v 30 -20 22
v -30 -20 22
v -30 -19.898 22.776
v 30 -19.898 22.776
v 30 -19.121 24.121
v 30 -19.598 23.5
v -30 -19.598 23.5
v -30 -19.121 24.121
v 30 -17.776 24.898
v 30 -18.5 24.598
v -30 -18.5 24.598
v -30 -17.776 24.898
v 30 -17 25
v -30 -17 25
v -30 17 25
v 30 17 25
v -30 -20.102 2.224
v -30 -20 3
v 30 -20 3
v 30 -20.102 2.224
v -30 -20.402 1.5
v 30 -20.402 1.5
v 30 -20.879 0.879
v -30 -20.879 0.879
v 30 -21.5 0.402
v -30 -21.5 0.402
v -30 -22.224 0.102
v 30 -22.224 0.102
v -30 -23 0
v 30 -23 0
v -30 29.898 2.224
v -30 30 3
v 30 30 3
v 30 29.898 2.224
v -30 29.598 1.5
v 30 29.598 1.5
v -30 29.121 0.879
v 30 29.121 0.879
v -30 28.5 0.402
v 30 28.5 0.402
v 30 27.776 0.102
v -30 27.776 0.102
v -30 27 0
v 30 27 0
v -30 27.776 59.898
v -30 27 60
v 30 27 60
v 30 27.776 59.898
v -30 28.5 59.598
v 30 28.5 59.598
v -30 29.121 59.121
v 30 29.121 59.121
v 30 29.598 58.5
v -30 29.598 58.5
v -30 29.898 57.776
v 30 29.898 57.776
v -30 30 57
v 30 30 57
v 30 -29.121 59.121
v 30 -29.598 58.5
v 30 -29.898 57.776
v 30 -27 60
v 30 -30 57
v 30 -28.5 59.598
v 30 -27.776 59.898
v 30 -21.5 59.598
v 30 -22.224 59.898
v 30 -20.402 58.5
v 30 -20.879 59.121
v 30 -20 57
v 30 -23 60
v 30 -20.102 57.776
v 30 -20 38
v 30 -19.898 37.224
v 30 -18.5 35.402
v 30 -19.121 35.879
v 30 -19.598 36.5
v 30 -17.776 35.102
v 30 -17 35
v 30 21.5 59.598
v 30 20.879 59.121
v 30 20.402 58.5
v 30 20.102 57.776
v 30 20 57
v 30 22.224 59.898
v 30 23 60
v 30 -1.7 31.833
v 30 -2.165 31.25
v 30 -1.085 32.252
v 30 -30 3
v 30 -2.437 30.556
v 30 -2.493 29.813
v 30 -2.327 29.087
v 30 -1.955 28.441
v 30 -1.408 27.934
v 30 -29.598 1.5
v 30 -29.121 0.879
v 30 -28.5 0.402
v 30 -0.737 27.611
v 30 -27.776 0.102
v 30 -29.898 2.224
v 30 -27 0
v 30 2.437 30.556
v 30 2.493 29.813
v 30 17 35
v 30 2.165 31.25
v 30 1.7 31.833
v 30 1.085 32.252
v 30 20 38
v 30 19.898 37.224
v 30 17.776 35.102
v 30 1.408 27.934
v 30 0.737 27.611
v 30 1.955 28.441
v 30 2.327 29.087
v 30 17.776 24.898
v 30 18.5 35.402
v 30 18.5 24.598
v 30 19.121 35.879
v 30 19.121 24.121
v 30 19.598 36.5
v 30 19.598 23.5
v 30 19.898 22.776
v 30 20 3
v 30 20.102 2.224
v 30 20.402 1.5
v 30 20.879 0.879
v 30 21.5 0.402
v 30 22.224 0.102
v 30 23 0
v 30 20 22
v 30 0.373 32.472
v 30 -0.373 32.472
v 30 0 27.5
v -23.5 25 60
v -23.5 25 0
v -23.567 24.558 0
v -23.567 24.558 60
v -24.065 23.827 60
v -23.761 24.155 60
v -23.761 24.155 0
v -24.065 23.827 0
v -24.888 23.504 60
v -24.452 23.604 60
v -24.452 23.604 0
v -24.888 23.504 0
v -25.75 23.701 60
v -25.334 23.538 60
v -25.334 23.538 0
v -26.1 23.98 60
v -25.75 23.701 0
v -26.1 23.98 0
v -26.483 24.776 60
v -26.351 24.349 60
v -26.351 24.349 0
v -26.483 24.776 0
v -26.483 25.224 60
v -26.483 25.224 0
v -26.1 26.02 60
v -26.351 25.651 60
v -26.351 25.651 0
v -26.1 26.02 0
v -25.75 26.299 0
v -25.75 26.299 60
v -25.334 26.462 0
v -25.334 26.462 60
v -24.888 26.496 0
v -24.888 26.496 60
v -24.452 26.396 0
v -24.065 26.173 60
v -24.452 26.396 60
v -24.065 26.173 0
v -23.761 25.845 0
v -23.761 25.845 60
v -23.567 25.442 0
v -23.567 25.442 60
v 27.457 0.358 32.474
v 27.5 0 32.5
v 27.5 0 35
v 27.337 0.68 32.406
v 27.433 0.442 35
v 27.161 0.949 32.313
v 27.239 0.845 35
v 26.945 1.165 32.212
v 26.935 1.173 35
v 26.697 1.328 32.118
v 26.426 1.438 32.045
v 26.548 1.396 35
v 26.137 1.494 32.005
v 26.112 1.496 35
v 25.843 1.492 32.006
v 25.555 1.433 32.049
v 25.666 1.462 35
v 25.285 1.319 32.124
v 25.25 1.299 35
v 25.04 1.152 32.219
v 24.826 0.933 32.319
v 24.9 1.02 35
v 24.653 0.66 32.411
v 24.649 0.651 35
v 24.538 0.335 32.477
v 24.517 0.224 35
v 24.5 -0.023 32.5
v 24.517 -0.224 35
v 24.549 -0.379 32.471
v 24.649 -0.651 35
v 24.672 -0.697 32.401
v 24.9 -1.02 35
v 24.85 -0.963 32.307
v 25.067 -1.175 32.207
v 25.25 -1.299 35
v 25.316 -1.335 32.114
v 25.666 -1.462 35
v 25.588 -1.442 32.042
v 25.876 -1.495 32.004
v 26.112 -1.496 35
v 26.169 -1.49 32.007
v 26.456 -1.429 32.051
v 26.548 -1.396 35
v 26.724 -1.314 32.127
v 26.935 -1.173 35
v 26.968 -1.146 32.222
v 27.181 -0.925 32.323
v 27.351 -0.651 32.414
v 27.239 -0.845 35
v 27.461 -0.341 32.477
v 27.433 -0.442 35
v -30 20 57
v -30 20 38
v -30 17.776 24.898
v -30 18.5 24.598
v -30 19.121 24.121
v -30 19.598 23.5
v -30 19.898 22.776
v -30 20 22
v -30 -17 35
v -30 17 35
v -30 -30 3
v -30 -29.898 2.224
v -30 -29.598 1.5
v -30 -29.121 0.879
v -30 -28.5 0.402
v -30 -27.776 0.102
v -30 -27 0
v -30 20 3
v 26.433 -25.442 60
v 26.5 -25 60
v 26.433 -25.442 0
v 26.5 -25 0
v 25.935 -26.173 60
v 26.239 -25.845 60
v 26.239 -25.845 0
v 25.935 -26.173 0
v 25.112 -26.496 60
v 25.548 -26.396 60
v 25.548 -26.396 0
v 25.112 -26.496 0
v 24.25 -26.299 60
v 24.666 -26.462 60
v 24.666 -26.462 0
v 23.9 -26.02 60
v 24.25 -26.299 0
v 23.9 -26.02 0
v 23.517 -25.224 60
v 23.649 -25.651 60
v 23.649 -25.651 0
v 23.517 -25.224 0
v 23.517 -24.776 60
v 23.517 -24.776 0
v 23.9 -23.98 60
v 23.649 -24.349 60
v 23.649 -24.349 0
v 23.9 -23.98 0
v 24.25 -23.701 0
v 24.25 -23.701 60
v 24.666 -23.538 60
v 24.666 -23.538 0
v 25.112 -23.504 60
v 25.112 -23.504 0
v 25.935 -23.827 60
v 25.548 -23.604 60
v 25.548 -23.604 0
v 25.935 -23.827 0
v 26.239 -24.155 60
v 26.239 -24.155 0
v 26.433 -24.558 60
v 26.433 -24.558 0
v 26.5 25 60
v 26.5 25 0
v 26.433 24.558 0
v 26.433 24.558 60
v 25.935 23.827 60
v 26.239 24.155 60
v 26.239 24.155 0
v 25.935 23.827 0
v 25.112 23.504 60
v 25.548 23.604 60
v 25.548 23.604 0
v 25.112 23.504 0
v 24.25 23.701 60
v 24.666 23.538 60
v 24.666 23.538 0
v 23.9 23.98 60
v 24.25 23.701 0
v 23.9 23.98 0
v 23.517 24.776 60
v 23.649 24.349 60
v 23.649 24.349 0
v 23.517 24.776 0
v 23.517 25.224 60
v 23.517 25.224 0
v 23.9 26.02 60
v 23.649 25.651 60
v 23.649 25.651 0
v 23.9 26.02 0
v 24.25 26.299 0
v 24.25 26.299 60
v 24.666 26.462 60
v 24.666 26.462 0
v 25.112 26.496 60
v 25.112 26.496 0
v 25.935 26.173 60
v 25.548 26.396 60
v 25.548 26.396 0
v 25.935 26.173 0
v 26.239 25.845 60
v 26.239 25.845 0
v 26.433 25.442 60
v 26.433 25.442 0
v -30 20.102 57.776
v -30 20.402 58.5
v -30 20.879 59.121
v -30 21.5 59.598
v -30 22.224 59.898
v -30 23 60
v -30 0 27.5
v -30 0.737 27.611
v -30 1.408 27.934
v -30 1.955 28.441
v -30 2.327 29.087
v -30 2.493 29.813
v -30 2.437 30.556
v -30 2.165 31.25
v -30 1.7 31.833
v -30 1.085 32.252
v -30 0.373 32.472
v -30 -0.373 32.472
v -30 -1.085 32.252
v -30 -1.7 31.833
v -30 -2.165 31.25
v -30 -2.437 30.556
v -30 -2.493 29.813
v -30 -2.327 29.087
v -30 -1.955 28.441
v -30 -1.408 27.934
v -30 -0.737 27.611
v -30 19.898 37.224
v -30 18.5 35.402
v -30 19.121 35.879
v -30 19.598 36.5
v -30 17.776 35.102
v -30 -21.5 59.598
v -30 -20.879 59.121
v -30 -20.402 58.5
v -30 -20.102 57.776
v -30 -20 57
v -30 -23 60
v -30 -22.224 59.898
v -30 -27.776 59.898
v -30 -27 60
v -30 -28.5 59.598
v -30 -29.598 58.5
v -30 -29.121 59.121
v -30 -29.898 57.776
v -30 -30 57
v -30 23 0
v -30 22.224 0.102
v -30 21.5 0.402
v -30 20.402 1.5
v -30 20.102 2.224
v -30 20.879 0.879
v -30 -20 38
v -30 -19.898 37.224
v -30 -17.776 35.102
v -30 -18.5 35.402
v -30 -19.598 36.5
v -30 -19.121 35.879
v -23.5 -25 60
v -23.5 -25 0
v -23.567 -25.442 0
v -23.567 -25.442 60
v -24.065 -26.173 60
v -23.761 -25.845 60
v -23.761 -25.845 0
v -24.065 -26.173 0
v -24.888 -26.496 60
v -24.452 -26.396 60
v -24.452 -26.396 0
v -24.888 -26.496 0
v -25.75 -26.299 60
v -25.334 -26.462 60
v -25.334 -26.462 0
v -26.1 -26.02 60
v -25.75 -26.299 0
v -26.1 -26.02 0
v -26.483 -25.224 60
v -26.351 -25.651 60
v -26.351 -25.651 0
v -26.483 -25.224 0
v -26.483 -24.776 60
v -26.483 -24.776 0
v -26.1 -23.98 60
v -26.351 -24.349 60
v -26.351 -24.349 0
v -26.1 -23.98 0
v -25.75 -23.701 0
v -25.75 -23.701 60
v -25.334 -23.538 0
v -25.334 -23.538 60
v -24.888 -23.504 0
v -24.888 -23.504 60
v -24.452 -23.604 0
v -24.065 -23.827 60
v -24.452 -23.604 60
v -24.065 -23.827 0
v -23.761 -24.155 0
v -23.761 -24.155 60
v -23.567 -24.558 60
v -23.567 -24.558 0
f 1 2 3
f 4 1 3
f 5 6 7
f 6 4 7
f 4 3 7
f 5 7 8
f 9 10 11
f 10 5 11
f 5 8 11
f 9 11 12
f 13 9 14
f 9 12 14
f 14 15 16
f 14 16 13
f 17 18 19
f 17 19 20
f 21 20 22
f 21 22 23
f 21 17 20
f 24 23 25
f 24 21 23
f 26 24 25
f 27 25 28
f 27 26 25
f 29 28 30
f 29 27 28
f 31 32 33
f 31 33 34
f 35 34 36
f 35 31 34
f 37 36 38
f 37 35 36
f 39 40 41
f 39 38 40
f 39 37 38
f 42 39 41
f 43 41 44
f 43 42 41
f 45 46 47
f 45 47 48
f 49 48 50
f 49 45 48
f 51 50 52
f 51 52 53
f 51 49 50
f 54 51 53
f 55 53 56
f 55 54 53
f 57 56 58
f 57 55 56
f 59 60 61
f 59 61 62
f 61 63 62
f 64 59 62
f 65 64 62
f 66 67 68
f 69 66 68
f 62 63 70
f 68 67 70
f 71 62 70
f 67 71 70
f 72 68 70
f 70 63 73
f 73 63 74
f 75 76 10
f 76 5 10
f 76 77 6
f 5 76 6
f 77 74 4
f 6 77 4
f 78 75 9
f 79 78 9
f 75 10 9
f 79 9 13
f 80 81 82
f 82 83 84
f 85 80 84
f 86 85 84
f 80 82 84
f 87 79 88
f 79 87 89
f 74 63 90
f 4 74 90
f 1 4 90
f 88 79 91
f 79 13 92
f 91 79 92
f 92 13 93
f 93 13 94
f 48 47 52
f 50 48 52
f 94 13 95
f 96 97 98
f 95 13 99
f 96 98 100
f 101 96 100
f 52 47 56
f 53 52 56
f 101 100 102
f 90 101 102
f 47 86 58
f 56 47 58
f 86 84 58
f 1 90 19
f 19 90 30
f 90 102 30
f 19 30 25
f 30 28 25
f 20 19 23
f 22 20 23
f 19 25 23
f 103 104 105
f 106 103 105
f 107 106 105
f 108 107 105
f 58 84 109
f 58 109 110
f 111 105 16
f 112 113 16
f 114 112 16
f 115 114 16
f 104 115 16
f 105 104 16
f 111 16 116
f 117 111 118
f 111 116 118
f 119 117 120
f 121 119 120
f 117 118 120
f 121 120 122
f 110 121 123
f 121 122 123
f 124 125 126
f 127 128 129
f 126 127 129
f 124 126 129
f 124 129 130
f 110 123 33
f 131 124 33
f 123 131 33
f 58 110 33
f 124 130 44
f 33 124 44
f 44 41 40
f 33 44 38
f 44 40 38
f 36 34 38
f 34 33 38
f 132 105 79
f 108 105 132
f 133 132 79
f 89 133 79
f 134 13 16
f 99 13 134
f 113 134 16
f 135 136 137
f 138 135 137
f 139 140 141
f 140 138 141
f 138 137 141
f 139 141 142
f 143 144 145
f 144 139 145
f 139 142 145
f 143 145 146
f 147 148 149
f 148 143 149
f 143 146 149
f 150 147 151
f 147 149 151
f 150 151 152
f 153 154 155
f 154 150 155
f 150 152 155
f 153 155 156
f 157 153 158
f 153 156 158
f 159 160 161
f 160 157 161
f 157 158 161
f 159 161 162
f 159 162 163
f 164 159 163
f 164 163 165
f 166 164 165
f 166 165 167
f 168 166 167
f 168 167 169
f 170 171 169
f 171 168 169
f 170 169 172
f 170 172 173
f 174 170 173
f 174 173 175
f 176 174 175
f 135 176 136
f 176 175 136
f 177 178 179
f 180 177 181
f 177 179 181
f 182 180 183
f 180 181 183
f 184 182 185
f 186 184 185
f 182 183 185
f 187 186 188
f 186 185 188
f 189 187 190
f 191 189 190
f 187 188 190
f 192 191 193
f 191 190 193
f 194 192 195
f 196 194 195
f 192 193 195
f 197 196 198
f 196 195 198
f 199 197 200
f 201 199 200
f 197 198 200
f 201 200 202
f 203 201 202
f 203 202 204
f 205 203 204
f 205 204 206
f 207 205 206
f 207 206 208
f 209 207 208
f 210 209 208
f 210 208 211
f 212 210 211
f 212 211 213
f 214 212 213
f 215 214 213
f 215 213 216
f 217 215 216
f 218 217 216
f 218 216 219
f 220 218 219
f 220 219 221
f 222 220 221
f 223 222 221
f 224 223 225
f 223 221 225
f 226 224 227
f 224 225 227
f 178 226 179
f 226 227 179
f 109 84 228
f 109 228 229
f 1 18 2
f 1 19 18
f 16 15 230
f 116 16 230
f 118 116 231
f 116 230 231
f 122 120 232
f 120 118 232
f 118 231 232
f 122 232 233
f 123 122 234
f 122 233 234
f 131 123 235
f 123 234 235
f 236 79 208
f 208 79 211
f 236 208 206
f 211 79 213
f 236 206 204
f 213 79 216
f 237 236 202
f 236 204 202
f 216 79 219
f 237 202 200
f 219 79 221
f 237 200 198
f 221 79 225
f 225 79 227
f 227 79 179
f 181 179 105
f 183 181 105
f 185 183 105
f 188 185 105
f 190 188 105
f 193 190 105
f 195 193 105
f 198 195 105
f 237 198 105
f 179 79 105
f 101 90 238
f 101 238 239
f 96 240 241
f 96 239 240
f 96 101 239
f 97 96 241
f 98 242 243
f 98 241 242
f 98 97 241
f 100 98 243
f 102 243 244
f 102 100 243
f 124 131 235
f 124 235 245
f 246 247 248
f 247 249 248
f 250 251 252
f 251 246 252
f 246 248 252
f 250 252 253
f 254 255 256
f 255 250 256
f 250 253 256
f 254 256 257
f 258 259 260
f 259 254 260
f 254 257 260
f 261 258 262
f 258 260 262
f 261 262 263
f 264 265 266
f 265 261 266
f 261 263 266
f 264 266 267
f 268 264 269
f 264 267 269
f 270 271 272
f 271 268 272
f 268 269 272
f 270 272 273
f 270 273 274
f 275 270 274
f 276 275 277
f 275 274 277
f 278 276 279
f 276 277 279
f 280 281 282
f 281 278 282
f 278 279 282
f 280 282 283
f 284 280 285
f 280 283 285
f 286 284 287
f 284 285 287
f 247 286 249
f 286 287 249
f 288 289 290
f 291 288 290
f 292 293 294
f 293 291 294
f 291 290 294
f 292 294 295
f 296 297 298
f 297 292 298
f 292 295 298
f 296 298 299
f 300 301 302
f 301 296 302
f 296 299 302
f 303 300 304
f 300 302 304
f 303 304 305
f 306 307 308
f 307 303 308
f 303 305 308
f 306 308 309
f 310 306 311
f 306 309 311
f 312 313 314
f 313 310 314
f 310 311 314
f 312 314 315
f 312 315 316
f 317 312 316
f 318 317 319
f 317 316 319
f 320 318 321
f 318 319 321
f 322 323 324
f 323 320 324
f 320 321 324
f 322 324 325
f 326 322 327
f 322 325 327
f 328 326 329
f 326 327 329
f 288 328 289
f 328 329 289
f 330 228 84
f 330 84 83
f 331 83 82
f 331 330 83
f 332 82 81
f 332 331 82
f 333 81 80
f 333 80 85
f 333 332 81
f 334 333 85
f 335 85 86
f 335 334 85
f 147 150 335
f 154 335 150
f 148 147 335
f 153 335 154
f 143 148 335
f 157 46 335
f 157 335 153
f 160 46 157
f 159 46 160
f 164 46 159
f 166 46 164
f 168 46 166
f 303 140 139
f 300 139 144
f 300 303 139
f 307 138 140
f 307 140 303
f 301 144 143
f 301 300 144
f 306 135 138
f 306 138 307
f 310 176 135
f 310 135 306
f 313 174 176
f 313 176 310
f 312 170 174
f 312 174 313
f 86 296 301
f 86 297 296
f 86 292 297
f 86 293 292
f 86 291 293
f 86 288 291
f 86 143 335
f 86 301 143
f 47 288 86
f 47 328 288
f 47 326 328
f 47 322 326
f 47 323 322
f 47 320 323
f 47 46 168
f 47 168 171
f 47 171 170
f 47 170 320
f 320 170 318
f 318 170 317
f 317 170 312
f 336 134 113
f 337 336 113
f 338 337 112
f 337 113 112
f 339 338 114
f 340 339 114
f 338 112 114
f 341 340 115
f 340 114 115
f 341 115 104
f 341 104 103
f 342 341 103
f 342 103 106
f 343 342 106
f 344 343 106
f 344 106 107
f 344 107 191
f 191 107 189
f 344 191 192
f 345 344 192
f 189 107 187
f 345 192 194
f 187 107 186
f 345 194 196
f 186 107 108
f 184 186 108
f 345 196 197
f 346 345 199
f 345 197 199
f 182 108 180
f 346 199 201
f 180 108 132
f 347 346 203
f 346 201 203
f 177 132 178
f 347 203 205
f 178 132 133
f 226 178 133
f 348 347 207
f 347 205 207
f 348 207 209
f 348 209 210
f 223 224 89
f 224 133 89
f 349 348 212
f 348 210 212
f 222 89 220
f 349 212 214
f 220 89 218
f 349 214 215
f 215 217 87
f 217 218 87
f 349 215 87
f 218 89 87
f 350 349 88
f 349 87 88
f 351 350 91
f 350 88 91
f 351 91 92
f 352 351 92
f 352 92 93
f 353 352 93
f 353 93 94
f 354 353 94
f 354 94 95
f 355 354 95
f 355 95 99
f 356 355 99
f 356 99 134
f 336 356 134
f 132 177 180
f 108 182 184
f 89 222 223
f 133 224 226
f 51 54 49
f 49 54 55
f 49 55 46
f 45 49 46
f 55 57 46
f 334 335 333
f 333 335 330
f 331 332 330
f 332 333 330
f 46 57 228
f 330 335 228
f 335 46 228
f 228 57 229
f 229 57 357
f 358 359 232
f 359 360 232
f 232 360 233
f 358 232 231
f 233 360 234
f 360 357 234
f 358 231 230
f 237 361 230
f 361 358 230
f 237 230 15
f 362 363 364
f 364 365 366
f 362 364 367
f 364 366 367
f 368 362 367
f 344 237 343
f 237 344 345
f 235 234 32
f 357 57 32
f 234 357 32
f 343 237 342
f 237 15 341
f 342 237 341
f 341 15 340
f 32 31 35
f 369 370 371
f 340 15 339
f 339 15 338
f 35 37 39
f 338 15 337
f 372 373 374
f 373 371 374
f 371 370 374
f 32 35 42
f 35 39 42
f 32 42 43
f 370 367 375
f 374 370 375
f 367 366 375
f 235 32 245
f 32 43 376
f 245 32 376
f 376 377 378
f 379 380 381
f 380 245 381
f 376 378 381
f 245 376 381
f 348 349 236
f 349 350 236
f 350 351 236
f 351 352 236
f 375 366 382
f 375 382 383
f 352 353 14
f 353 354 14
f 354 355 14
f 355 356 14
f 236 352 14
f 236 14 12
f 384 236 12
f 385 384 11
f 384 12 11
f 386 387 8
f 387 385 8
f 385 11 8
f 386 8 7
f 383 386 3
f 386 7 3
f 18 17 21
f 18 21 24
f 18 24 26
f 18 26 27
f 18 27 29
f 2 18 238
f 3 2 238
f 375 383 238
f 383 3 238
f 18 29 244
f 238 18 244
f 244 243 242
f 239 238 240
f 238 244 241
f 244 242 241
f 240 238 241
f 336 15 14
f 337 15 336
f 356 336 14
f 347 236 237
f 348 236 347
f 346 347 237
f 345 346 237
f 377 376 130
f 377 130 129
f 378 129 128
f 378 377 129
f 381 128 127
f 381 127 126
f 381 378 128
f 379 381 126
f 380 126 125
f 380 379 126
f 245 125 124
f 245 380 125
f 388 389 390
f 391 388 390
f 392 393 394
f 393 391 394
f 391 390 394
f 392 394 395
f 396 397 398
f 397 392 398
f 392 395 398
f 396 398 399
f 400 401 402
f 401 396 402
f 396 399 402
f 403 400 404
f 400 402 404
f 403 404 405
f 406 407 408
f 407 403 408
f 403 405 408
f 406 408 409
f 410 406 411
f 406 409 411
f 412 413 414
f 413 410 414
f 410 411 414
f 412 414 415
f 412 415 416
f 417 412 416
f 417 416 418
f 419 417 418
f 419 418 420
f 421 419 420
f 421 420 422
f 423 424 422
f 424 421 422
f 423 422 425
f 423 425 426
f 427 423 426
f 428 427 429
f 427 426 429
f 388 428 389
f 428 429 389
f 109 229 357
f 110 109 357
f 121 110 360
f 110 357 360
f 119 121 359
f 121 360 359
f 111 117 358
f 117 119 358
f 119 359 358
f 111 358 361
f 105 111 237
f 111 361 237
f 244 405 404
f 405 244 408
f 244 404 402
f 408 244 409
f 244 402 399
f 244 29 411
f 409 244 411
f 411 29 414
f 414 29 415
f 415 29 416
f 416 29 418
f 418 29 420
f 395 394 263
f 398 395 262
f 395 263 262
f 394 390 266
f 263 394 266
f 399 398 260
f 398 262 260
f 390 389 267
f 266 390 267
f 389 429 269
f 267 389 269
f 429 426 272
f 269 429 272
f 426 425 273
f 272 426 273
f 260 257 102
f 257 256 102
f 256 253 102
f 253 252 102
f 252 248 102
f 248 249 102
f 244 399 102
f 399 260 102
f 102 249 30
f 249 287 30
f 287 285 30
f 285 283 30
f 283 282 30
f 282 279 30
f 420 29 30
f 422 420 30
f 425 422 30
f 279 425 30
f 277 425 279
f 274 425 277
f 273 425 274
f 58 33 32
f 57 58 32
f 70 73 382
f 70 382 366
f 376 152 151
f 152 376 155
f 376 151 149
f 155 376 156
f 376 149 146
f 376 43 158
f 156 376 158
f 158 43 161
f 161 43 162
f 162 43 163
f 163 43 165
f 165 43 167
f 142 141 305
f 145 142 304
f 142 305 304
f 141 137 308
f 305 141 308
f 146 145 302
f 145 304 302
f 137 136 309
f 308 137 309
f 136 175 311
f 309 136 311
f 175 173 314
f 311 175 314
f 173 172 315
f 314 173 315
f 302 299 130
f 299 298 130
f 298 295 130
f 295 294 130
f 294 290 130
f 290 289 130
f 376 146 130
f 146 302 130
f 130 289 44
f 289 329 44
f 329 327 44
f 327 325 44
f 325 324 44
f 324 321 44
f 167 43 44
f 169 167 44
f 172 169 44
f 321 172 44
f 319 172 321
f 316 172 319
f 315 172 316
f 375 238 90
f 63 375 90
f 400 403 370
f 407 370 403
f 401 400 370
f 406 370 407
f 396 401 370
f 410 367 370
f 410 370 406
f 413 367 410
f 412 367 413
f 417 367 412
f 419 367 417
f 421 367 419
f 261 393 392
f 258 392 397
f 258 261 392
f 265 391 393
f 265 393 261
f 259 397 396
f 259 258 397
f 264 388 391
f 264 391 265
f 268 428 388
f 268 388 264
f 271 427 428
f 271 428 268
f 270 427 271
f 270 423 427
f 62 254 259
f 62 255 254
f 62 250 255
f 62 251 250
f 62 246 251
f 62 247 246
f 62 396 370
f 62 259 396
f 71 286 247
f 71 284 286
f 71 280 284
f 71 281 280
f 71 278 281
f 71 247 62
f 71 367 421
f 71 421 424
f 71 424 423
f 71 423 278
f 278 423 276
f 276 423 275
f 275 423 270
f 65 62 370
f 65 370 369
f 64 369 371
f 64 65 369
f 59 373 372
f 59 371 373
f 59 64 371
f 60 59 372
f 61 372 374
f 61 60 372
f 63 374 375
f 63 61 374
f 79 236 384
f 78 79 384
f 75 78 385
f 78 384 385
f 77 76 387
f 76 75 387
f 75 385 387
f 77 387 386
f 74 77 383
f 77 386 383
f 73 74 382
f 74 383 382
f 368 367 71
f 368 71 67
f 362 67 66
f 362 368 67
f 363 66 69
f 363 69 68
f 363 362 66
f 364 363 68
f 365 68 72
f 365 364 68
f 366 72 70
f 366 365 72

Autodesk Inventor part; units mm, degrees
ref_plane "YZ Plane" through (0, 0, 0) normal (1, 0, 0) x (0, 1, 0)
ref_plane "XZ Plane" through (0, 0, 0) normal (0, 1, 0) x (-1, 0, 0)
ref_plane "XY Plane" through (0, 0, 0) normal (0, 0, 1) x (1, 0, 0)
sketch "Sketch1" plane through (0, 0, 0) normal (0, 0, 1) x (1, 0, 0)
  line L0 (-30, -30) -> (30, -30)
  line L1 (30, -30) -> (30, 30)
  line L2 (30, 30) -> (-30, 30)
  line L3 (-30, 30) -> (-30, -30)
  line L4 (-30, -30) -> (30, 30) construction
  line L5 (30, -30) -> (-30, 30) construction
  line L6 (30, 30) -> (25, 30) construction
  line L7 (25, 30) -> (25, 25) construction
  line L8 (-30, 30) -> (-25, 30) construction
  line L9 (-25, 30) -> (-25, 25) construction
  line L10 (-30, -30) -> (-30, -25) construction
  line L11 (-30, -25) -> (-25, -25) construction
  line L12 (30, -30) -> (30, -25) construction
  line L13 (30, -25) -> (25, -25) construction
  circle A0 centre (-25, 25) radius 1.5
  circle A1 centre (25, 25) radius 1.5
  circle A2 centre (25, -25) radius 1.5
  circle A3 centre (-25, -25) radius 1.5
  point P0 (0, 0)
  dimension "d0" = 60
  dimension "d1" = 60
  dimension "d2" = 5
  dimension "d3" = 5
  dimension "d4" = 5
  dimension "d5" = 5
  dimension "d6" = 5
  dimension "d7" = 5
  dimension "d8" = 5
  dimension "d9" = 5
  dimension "d10" = 3
  dimension "d11" = 3
  dimension "d12" = 3
  dimension "d13" = 3
extrude "Block" add sketch "Sketch1" along normal blind 60
sketch "Sketch2" plane through (30, -30, 0) normal (1, 0, 0) x (0, 0, -1)
  line L0 (0, 0) -> (0, 60) construction
  line L1 (-60, 0) -> (0, 60) construction
  circle A0 centre (-30, 30) radius 2.5
  point P0 (0, 30)
  dimension "d17" = 5
extrude "Motor Mount" cut sketch "Sketch2" against normal blind 60
sketch "Sketch3" plane through (30, -30, 0) normal (1, 0, 0) x (0, 0, -1)
  line L0 (0, 60) -> (-60, 60) construction
  line L1 (-60, 60) -> (-60, 50) construction
  line L2 (-60, 60) -> (-60, 0) construction
  line L3 (-60, 50) -> (0, 50) construction
  line L4 (0, 60) -> (0, 0) construction
  line L5 (-60, 0) -> (-60, 10) construction
  line L6 (-60, 10) -> (0, 10) construction
  circle A0 centre (-30, 30) radius 2.5 construction
  line L7 (-30, 30) -> (-25, 30) construction
  line L8 (-30, 30) -> (-35, 30) construction
  line L9 (-35, 30) -> (-35, 10) construction
  line L10 (-25, 30) -> (-25, 10) construction
  line L11 (-25, 30) -> (-25, 50) construction
  line L12 (-35, 30) -> (-35, 50) construction
  line L13 (-60, 50) -> (-35, 50)
  line L14 (-35, 10) -> (-60, 10)
  line L15 (-35, 10) -> (-35, 50)
  line L16 (-25, 50) -> (-25, 10)
  line L17 (0, 10) -> (-25, 10)
  line L18 (-25, 50) -> (0, 50)
  line L19 (0, 50) -> (0, 10)
  line L20 (-60, 10) -> (-60, 50)
  point P0 (0, 30)
  dimension "d20" = 10
  dimension "d21" = 10
  dimension "d22" = 5
  dimension "d23" = 5
extrude "Plastic Savings" cut sketch "Sketch3" against normal blind 60
fillet "Fillets FTW" radius 3 12 edges at (0, -30, 60) (0, -20, 60) (0, 30, 60) (0, 20, 60) (0, 20, 35) (0, -20, 35) (0, -20, 0) (0, -30, 0) (0, -20, 25) (0, 20, 25) (0, 30, 0) (0, 20, 0)
sketch "Sketch4" plane through (30, -17, 35) normal (0, 0, 1) x (1, 0, 0)
  line L0 (0, 19.5) -> (0, 14.5) construction
  line L1 (0, 17) -> (-4, 17) construction
  circle A0 centre (-4, 17) radius 1.5
  point P0 (-30, 17)
  dimension "d27" = 4
  dimension "d28" = 3
extrude "Axle Lock" cut sketch "Sketch4" against normal blind 3.75
properties part number "60x60Idler"
